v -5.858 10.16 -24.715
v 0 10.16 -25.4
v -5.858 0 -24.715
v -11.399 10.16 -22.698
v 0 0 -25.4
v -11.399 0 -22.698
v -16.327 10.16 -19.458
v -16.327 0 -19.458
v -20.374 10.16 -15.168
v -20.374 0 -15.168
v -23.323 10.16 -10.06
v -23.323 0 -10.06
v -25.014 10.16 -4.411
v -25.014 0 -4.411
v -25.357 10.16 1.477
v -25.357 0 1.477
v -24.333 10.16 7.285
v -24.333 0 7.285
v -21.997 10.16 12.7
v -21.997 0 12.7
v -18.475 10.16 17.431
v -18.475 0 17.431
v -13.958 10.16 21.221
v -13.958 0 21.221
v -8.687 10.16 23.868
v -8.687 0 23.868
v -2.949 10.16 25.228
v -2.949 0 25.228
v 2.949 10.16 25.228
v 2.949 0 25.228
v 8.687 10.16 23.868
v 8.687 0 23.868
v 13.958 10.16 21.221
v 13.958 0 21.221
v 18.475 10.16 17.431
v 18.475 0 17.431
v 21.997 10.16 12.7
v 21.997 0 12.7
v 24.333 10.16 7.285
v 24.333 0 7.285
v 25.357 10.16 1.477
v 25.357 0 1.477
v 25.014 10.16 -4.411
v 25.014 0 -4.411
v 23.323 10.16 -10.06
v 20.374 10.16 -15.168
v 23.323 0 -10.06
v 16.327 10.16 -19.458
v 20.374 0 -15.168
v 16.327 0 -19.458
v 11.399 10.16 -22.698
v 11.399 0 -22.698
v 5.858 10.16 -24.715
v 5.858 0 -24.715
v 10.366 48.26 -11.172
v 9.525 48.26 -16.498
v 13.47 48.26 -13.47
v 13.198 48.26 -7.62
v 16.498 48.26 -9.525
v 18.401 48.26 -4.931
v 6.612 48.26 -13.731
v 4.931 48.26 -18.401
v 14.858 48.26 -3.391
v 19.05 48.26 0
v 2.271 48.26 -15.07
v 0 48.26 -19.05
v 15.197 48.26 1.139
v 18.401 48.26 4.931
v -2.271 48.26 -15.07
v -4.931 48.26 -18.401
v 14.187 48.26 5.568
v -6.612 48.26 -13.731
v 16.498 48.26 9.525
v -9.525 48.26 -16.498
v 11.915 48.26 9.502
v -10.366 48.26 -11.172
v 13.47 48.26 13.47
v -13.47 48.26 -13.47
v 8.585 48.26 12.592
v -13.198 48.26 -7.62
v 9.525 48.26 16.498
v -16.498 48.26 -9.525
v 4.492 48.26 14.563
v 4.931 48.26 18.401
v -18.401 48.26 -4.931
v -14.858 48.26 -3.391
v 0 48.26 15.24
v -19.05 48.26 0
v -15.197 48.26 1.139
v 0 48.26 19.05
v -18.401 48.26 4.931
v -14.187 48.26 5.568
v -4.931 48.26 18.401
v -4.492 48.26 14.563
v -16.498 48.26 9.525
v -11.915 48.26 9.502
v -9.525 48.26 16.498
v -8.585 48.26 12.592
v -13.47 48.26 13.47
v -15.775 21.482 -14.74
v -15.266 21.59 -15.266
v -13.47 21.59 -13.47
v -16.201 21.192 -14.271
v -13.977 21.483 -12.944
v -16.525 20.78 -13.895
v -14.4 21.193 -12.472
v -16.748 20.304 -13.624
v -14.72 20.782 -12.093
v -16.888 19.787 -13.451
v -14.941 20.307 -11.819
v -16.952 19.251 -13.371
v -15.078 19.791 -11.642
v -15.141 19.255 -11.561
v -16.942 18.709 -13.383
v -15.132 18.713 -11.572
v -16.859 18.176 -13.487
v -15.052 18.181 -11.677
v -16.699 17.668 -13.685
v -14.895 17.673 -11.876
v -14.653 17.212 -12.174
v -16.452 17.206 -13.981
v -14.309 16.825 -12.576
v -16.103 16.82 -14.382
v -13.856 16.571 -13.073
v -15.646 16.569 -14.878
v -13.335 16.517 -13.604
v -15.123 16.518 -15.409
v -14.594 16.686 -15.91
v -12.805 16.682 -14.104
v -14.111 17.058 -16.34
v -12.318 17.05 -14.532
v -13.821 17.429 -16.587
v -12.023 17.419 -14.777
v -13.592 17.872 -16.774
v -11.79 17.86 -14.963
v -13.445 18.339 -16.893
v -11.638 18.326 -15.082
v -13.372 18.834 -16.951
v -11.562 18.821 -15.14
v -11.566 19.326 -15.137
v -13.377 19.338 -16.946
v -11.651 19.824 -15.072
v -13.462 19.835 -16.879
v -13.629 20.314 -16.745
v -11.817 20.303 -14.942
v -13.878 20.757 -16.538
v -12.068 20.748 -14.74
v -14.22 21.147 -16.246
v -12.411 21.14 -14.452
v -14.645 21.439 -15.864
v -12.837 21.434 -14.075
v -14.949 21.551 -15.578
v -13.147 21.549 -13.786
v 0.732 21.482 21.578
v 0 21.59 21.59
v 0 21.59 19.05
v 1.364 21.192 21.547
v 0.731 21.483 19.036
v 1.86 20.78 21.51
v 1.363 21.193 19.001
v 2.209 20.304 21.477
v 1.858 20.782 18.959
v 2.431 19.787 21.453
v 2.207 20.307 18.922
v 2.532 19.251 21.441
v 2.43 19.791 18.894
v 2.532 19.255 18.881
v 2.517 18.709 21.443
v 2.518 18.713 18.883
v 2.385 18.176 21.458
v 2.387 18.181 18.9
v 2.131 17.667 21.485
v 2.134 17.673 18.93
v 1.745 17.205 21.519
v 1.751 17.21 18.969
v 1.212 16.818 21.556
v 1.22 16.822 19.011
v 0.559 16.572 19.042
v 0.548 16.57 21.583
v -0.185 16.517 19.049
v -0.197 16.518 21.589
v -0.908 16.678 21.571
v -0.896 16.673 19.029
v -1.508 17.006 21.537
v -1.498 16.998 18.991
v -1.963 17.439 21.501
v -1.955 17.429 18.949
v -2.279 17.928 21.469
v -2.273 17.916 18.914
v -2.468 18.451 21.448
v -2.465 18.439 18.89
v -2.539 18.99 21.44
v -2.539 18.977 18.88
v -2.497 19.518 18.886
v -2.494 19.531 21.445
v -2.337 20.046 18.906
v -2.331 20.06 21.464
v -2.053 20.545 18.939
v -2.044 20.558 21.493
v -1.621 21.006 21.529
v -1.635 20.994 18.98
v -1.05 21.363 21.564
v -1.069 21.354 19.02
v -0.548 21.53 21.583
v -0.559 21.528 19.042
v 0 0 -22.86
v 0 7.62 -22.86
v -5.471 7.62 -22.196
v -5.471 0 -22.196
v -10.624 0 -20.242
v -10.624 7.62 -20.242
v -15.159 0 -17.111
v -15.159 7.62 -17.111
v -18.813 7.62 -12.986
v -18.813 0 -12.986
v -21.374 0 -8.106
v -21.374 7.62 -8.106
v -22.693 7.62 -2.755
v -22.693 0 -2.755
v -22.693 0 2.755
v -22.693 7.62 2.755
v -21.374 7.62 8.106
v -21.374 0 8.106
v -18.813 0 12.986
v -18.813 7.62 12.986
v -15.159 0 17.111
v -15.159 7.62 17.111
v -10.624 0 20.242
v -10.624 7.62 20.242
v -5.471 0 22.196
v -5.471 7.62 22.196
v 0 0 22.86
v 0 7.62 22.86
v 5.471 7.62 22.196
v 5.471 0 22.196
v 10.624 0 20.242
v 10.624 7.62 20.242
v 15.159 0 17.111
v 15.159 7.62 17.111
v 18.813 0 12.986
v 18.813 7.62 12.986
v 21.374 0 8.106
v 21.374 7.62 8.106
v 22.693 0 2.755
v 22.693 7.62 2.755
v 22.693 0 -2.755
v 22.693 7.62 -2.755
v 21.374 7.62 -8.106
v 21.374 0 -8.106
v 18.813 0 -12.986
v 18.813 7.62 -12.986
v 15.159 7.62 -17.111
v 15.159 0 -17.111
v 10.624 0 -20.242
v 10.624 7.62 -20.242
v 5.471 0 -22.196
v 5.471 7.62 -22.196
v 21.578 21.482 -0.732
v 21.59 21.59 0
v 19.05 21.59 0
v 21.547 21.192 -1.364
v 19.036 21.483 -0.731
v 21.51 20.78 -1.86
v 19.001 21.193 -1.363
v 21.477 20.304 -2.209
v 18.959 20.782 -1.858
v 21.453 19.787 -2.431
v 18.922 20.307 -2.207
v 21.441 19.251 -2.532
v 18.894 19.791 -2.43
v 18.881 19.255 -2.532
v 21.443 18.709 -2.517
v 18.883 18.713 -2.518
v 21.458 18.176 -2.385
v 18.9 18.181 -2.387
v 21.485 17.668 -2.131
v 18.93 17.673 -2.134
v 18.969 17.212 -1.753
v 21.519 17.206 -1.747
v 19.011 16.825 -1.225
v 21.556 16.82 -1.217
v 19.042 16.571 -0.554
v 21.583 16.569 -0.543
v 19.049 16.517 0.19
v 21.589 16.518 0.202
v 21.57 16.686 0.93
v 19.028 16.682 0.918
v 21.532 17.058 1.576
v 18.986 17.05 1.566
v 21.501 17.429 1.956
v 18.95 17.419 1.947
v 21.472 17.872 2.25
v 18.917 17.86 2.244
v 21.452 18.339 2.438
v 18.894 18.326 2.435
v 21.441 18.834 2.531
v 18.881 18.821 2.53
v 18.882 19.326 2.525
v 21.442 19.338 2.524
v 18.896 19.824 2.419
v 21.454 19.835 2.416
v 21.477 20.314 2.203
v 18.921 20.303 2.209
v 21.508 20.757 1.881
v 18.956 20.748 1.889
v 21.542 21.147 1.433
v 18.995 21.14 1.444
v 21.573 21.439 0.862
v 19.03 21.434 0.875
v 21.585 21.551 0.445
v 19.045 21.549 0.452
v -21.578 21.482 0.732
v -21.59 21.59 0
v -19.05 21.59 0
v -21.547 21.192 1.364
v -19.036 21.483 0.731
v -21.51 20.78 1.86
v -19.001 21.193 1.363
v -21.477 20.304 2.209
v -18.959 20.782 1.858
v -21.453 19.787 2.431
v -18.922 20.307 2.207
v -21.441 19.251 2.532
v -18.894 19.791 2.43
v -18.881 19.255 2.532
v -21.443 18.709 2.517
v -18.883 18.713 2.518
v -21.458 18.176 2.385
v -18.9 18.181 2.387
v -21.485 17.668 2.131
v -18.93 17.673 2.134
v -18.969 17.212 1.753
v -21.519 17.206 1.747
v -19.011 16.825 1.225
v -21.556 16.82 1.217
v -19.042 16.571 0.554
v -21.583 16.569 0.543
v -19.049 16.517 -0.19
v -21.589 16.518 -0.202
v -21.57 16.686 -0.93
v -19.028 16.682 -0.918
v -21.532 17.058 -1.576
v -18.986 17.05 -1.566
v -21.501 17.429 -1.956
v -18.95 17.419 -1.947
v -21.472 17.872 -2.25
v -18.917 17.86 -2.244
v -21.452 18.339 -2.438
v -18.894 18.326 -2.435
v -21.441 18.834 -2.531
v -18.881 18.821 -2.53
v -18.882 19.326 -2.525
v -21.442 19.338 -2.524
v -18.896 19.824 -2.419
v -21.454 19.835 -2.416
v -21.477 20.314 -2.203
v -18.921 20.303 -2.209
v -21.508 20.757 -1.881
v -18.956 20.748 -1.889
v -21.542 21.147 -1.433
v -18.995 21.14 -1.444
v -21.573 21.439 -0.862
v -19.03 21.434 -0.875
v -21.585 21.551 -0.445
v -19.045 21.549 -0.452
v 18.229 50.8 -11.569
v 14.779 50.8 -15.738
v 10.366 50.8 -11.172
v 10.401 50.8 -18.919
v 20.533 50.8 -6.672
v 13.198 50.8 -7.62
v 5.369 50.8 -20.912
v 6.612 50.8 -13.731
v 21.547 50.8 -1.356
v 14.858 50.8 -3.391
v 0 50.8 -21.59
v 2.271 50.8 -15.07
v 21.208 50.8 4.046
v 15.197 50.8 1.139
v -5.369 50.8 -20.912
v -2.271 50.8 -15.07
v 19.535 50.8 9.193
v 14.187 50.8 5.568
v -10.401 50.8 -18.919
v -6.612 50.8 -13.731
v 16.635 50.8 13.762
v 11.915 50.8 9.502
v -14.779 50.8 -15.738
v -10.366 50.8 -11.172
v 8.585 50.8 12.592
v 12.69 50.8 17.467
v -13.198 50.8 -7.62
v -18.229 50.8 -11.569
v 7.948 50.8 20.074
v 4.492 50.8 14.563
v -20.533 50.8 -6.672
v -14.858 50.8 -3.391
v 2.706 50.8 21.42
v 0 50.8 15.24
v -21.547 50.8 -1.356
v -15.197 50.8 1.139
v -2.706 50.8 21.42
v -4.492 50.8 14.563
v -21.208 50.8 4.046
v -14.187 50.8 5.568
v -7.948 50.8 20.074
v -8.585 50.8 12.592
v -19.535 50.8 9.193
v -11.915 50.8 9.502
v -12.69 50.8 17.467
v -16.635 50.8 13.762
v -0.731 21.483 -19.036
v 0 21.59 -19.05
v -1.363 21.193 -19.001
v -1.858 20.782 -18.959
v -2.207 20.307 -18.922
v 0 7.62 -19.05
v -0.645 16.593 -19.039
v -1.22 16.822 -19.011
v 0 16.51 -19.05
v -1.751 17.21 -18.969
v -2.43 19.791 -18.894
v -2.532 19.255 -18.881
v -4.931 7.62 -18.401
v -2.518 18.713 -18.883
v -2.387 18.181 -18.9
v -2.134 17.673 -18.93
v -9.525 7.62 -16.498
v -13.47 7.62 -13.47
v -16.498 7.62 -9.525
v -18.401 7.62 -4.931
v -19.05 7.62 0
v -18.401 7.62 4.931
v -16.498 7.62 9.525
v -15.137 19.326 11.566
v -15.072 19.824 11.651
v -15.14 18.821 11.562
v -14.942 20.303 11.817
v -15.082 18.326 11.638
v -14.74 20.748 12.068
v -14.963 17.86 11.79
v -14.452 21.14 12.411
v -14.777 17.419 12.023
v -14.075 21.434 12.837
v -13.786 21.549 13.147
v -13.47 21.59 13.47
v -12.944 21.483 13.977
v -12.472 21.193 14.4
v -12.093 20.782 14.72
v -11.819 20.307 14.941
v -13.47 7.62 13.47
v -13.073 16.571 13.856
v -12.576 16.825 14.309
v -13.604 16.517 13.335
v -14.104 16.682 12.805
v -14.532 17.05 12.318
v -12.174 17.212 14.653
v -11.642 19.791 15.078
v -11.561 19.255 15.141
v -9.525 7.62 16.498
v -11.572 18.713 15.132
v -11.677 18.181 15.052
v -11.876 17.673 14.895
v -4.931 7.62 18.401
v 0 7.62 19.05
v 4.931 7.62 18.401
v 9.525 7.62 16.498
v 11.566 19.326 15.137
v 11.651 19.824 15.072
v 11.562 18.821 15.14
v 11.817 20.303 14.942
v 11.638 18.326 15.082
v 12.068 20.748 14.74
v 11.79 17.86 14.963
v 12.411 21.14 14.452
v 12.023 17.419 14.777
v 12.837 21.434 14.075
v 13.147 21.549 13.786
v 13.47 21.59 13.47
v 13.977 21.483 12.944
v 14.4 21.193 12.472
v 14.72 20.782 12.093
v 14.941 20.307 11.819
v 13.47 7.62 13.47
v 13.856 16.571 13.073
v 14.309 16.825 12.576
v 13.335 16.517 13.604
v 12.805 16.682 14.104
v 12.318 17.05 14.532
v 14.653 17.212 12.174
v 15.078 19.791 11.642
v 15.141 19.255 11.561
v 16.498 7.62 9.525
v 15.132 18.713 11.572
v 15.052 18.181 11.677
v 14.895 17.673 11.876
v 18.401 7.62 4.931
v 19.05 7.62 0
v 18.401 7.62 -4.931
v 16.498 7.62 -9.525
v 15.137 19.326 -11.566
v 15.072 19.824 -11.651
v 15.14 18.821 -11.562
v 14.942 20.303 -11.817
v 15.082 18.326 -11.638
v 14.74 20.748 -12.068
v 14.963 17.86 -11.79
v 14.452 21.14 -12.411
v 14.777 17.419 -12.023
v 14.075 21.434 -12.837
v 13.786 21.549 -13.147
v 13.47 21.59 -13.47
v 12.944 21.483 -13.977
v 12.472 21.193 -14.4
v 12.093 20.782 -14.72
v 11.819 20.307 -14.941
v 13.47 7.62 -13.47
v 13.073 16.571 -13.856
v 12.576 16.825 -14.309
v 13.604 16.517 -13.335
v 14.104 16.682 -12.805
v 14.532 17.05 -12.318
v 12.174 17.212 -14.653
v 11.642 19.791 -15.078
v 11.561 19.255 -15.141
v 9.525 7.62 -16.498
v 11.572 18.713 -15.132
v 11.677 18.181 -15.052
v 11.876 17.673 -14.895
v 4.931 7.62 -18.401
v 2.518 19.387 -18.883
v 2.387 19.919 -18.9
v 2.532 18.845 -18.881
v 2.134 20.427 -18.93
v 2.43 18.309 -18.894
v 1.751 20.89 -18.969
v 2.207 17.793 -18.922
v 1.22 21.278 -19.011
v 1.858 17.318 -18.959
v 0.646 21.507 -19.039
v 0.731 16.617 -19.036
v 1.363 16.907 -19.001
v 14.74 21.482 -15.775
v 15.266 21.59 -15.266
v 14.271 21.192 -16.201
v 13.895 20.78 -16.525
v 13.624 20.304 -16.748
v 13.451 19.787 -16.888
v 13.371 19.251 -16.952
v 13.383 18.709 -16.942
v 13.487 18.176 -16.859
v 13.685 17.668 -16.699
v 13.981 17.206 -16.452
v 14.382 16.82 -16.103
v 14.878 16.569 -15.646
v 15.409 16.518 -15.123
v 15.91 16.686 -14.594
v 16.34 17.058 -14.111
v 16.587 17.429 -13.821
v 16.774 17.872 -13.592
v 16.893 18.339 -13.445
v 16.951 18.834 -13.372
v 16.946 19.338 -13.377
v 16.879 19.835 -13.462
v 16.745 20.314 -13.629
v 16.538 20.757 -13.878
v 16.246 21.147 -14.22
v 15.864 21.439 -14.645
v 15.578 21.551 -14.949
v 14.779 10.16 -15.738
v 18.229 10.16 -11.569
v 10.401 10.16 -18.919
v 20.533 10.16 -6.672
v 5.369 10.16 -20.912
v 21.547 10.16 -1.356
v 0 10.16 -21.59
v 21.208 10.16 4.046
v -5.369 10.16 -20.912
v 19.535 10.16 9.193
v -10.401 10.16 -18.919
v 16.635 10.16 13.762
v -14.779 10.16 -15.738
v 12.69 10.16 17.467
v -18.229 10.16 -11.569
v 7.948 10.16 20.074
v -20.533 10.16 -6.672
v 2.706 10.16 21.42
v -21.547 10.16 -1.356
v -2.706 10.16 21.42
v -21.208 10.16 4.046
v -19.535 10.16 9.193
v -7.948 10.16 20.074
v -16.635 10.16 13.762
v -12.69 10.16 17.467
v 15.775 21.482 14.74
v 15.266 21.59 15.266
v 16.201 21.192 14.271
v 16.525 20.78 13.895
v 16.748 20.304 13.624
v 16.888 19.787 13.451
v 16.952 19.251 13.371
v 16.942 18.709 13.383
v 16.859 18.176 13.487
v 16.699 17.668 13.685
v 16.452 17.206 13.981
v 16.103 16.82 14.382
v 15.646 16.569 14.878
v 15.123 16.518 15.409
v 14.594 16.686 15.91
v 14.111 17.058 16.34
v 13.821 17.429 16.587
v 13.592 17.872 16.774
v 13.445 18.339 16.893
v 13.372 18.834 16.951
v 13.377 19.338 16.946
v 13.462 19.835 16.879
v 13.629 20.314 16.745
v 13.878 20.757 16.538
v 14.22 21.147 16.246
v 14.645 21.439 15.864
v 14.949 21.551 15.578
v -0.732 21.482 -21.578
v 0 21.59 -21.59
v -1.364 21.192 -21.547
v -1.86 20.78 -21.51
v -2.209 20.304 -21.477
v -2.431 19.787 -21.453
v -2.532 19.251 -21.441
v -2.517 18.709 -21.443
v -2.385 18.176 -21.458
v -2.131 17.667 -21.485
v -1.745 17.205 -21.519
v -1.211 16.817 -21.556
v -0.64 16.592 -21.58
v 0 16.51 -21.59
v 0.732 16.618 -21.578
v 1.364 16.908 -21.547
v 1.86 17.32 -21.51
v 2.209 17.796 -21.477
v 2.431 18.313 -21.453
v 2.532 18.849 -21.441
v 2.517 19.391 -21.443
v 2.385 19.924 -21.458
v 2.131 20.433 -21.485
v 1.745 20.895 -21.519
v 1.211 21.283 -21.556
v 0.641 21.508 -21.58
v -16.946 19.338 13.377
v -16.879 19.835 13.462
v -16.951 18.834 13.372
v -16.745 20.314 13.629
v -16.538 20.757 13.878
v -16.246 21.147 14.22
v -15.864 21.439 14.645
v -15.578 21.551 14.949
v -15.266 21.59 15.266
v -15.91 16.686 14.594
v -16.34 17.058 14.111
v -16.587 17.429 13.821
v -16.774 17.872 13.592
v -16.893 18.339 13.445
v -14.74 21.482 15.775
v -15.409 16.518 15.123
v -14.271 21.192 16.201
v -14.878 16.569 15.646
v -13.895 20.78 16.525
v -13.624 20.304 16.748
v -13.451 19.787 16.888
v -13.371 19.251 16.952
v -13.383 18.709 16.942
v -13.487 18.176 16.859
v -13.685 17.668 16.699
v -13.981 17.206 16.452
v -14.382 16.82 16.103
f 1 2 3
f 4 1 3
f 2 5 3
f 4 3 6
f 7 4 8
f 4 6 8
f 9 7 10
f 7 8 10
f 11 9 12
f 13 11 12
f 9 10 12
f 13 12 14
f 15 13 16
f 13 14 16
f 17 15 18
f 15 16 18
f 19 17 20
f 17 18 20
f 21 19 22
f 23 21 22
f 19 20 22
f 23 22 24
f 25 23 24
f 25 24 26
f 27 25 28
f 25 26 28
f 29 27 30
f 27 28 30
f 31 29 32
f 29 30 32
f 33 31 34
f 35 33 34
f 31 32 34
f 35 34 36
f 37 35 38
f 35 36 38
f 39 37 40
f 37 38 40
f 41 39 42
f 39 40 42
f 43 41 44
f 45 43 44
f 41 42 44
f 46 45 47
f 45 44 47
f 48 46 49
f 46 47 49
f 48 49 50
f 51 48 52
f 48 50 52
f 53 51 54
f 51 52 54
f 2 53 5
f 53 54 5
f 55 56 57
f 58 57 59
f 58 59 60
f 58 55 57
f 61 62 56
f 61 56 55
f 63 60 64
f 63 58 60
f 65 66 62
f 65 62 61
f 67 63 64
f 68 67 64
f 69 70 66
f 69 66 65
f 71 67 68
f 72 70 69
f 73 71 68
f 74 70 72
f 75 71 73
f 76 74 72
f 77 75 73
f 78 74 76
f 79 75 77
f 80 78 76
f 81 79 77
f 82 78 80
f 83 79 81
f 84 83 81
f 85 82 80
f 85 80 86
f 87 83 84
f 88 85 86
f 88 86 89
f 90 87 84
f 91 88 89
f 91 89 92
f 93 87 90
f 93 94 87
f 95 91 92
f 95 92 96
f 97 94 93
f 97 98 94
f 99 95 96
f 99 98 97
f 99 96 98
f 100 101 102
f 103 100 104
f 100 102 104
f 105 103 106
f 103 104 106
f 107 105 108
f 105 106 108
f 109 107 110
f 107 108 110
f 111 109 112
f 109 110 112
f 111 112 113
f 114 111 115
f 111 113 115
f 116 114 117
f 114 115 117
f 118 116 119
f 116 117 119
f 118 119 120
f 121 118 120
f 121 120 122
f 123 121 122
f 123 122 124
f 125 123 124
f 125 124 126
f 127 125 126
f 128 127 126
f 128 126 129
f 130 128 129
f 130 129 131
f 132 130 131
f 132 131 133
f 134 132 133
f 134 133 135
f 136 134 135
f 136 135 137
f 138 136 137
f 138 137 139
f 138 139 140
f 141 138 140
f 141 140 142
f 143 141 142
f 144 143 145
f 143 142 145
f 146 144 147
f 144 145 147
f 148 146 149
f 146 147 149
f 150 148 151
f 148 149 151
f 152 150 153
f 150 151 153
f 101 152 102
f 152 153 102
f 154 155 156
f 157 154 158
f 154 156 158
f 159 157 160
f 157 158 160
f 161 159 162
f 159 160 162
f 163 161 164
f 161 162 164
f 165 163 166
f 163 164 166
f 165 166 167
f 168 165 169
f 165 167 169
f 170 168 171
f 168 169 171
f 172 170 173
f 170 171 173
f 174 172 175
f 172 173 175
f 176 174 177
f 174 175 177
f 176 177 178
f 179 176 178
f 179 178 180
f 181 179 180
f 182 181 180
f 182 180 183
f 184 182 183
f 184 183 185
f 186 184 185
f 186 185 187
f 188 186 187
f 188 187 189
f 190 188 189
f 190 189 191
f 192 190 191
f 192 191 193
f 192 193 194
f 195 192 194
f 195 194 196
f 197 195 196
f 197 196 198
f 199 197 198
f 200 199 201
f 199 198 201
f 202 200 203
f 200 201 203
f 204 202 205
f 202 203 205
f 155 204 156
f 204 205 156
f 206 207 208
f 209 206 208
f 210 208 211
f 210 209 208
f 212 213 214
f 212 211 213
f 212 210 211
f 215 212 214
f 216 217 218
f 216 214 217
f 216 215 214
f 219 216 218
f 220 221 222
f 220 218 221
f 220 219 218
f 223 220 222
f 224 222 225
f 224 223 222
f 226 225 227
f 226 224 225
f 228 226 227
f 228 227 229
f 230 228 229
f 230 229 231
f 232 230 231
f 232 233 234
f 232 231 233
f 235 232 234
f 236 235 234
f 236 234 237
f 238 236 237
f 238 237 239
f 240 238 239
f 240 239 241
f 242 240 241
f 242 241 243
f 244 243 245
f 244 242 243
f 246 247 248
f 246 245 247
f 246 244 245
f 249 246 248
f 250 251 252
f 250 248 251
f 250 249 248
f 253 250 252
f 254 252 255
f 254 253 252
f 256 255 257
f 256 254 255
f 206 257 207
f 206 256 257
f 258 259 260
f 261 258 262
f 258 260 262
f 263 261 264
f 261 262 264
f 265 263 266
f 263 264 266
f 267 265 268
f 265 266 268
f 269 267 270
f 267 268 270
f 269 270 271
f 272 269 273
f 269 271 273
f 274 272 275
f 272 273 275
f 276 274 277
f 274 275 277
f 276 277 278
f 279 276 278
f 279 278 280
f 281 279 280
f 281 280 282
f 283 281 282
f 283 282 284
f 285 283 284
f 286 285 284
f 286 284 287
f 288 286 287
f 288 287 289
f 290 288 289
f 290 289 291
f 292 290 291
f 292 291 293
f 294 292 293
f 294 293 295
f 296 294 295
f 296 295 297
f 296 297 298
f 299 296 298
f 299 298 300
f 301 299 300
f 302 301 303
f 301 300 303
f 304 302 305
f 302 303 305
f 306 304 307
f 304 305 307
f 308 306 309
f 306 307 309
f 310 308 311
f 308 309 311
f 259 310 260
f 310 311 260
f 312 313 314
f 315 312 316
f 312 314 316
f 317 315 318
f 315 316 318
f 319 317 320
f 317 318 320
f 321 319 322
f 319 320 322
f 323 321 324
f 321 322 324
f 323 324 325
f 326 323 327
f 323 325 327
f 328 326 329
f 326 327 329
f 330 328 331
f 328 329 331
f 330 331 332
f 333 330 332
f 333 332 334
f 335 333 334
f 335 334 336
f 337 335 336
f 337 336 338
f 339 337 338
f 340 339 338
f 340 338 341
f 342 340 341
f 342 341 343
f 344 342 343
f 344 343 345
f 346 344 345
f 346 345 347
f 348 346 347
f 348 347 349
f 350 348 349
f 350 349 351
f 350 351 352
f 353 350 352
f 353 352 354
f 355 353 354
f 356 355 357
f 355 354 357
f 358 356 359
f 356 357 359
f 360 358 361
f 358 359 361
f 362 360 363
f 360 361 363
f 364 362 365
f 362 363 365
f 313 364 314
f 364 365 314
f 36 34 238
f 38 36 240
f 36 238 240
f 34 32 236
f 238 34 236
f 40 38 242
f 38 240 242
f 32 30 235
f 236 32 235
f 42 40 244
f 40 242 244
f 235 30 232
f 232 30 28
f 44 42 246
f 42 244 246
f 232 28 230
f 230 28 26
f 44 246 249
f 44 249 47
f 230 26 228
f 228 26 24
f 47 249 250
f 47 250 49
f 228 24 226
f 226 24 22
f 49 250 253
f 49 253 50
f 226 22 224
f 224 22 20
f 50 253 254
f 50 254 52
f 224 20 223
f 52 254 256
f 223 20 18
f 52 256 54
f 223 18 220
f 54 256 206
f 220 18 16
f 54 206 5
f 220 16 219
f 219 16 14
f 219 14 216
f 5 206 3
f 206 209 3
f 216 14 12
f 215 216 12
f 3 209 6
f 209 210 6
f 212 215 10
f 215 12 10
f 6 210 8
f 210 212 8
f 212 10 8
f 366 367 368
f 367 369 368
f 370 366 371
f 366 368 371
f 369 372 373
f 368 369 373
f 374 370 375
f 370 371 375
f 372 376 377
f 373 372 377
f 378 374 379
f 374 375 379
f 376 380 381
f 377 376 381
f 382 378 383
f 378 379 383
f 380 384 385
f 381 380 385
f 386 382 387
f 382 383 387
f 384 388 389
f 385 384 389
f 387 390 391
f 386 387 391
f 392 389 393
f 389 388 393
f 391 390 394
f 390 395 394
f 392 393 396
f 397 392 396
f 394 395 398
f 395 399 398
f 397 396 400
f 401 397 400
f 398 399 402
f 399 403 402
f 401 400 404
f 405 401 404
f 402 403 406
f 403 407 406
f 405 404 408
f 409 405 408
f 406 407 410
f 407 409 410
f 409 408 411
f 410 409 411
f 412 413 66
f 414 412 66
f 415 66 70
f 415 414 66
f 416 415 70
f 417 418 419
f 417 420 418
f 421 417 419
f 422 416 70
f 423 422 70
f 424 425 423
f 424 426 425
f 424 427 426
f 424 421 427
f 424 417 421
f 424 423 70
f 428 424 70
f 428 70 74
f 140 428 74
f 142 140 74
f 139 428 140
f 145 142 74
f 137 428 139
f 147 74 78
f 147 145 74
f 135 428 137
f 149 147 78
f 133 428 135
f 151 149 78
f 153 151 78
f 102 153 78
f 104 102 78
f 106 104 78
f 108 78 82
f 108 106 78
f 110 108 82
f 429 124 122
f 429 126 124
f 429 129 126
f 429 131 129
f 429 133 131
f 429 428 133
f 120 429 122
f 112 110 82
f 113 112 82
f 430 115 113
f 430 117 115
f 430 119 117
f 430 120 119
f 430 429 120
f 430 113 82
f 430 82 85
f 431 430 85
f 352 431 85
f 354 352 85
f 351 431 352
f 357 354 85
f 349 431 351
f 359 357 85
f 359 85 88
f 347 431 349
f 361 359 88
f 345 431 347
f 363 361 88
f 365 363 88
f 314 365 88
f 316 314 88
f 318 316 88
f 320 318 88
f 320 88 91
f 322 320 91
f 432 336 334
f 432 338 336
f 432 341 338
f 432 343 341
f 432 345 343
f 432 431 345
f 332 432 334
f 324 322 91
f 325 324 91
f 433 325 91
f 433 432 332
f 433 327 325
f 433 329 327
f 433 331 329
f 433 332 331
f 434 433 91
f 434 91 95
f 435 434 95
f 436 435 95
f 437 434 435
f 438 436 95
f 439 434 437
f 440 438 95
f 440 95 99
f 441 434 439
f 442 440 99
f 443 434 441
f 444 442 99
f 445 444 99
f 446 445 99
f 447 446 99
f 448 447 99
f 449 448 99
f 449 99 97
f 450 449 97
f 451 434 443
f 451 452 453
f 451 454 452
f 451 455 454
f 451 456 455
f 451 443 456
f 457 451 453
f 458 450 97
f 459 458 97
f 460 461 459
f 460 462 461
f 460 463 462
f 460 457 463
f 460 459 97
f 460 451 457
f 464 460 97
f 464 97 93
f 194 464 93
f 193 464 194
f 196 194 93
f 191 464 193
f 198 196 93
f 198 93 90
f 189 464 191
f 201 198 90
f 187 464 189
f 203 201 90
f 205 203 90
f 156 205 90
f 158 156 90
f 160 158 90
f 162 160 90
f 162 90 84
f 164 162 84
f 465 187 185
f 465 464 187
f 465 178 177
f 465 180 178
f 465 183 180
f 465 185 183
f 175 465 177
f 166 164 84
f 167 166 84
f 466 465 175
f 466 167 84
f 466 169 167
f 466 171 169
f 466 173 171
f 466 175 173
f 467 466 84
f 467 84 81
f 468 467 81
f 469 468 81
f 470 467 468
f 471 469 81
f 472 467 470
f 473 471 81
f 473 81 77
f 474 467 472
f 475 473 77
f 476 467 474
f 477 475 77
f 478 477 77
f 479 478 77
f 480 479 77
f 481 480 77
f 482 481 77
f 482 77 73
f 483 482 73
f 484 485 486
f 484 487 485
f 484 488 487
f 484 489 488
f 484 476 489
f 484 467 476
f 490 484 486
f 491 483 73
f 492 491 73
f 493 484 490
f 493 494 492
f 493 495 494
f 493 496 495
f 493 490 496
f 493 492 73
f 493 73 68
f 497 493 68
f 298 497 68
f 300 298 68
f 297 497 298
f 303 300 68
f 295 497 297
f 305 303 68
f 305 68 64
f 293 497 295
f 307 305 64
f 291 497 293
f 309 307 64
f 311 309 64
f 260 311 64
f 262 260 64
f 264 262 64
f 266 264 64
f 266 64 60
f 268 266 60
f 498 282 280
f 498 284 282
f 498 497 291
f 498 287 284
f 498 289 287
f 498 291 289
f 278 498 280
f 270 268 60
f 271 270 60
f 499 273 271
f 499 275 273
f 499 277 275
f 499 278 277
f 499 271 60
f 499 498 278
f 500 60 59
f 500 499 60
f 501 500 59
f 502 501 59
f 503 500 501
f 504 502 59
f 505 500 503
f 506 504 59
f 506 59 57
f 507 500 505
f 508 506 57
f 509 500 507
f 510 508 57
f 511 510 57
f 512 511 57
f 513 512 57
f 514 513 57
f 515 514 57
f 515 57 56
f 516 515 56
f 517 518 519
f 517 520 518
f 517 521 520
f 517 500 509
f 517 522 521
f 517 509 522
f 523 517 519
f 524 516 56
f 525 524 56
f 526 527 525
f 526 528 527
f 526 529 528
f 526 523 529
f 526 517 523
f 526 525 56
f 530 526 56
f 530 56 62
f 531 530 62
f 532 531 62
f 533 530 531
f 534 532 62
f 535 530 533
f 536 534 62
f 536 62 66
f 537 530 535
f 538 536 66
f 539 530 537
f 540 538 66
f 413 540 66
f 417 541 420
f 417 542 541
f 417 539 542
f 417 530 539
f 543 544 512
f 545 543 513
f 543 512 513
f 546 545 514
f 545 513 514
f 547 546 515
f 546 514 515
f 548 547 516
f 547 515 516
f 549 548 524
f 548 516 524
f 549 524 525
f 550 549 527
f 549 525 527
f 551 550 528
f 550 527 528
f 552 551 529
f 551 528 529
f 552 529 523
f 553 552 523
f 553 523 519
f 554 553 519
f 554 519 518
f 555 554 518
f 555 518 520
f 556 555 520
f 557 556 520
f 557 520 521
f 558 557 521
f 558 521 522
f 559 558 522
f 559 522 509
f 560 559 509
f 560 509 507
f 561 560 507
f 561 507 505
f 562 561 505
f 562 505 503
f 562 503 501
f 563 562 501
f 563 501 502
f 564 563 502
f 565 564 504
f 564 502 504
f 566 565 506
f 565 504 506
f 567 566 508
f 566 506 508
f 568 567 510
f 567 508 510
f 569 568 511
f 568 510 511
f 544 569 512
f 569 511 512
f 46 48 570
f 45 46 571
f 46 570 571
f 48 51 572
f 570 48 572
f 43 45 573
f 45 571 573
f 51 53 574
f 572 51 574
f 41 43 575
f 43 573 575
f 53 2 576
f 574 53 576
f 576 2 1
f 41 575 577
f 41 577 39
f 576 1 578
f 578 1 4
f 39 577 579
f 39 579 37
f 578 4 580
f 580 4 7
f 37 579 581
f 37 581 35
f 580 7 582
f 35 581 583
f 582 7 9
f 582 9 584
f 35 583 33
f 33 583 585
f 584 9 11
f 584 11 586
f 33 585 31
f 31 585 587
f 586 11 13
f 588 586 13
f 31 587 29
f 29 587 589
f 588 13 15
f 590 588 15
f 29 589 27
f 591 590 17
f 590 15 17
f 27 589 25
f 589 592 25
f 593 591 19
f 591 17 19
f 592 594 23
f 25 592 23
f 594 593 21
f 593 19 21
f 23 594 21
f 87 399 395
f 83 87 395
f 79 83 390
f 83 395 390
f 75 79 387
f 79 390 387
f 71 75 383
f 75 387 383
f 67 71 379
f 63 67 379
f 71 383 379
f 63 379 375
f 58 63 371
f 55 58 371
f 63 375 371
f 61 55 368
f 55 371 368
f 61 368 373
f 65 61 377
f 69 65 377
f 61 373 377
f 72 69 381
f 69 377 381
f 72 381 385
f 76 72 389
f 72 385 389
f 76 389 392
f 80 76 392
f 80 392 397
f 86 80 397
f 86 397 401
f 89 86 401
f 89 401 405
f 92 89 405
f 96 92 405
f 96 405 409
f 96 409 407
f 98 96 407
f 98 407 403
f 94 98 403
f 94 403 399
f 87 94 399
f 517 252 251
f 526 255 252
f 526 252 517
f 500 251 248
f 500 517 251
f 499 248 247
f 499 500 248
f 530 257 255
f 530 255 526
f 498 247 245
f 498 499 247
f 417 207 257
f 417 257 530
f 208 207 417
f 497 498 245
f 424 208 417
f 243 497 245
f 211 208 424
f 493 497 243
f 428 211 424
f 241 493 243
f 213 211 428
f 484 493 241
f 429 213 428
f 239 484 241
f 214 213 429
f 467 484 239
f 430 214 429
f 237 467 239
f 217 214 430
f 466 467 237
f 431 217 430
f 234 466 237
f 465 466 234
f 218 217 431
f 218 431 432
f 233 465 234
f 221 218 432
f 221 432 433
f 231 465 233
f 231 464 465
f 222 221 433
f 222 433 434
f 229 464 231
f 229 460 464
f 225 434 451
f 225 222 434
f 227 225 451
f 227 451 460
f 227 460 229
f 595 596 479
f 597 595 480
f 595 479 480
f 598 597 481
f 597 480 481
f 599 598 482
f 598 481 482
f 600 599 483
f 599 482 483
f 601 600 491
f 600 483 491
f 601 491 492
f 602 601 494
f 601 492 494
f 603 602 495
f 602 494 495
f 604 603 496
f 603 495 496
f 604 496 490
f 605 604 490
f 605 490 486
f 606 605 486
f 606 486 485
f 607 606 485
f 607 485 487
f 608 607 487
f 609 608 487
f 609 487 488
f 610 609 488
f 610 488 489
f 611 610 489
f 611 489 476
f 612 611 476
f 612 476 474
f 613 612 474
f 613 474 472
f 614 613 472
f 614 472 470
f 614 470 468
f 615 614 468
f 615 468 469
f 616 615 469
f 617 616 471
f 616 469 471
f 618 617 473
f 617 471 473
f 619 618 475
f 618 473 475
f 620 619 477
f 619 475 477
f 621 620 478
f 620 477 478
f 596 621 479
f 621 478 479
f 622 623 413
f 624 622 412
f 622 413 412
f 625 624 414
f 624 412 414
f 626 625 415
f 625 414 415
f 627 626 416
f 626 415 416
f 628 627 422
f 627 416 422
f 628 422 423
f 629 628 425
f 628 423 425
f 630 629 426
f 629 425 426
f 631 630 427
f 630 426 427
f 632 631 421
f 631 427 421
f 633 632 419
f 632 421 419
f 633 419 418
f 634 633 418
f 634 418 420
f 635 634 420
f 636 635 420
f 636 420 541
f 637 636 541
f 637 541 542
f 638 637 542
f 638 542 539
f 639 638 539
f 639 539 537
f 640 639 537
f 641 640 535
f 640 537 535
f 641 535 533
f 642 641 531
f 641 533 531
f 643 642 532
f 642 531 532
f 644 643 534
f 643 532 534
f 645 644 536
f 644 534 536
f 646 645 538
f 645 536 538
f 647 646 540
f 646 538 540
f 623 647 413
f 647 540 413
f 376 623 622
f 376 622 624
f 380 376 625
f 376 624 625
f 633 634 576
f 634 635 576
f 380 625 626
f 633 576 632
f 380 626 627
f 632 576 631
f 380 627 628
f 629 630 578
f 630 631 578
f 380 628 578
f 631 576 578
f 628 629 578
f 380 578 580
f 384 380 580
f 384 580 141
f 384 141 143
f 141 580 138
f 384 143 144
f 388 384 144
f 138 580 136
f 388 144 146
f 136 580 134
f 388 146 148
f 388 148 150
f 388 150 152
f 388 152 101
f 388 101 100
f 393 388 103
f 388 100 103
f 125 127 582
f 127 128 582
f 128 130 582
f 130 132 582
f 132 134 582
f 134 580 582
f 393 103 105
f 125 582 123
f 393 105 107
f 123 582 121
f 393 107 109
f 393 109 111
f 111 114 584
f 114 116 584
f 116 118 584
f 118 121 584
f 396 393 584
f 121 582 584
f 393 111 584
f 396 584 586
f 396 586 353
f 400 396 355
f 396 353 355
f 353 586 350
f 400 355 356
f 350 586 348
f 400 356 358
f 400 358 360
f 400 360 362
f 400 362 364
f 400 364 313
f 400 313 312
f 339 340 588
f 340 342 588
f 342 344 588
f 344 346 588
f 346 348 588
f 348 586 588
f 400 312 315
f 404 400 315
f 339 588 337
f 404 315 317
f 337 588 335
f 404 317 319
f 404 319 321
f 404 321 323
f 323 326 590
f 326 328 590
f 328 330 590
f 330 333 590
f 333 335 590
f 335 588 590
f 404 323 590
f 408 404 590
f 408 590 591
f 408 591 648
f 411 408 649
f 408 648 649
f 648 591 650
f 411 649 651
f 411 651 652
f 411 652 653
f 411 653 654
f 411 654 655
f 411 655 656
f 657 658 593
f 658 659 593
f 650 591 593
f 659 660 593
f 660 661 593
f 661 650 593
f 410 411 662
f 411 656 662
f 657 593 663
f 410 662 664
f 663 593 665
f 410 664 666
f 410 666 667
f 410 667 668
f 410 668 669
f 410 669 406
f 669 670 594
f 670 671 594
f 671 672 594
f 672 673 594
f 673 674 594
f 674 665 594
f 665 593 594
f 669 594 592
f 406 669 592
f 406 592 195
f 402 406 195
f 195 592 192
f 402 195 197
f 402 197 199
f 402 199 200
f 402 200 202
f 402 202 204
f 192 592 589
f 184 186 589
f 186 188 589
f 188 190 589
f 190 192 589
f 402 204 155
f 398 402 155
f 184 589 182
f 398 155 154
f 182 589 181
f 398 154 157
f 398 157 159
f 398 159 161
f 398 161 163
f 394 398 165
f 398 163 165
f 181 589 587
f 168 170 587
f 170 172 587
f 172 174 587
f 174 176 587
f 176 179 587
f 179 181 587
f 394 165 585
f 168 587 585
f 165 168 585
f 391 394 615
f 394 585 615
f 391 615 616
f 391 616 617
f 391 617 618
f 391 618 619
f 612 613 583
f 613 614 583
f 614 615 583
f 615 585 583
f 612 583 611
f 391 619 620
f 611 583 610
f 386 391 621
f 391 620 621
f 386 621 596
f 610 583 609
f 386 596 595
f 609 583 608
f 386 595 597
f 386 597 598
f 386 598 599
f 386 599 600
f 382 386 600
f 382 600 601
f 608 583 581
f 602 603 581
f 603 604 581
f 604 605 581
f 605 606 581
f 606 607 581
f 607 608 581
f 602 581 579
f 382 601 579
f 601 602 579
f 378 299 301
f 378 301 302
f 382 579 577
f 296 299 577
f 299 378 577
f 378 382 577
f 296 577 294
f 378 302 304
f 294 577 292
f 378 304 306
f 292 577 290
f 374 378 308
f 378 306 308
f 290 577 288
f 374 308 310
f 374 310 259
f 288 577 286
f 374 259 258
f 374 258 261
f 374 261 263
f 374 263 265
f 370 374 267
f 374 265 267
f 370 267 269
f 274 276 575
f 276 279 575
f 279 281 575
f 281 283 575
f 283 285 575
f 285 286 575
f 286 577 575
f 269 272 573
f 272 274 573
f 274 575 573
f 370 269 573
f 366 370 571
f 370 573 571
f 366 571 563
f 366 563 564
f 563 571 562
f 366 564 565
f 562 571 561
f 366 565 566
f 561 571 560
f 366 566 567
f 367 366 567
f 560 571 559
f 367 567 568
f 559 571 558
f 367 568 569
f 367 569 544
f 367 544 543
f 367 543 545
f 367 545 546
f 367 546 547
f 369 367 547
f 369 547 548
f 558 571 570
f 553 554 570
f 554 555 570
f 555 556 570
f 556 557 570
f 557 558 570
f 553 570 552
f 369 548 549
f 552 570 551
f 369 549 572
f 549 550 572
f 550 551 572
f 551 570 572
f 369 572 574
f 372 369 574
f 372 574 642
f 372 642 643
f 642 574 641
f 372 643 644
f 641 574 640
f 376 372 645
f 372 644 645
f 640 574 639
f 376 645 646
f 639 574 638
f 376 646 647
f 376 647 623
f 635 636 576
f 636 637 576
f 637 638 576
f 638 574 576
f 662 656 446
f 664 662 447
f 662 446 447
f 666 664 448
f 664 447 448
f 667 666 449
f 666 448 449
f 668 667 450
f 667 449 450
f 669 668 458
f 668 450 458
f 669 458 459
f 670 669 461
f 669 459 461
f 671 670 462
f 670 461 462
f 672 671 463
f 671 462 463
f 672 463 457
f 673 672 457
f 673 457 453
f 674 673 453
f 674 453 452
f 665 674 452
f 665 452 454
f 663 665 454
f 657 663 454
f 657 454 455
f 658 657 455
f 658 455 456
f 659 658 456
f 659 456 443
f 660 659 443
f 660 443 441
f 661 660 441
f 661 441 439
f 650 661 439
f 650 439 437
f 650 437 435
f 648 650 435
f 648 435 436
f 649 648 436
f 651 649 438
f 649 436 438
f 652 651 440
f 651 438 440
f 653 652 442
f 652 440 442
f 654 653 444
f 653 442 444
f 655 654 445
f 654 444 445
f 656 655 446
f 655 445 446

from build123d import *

# Parameters (mm, degrees)
SHELL3_T           = -2.54
SKETCH2_R          = 15.24
CUT_EXTRUDE2_DEPTH = 63.217039467
SKETCH3_R          = 2.54
CUT_EXTRUDE3_DEPTH = 63.217039467
CIRPATTERN1_COUNT  = 8


with BuildPart() as part:
    # Sketch1 → Revolve1 (revolve)
    with BuildSketch(Plane.XY, mode=Mode.PRIVATE) as revolve1_sk:
        Polygon((0, 0), (0, 50.8), (21.59, 50.8), (21.59, 10.16), (25.4, 10.16), (25.4, 0), align=None)
    revolve(revolve1_sk.sketch.rotate(Axis((0, 0, 0), (0, 1, 0)), 90), axis=Axis((0, 0, 0), (0, 1, 0)))

    # Shell3
    shell3_openings = [part.faces().sort_by_distance(p)[0] for p in [
        (0, 0, 0),
    ]]
    offset(amount=SHELL3_T, openings=shell3_openings, kind=Kind.INTERSECTION)

    # Sketch2 → Cut-Extrude2 (cut, through all)
    with BuildSketch(Plane(origin=(0, 50.8, 0), x_dir=(1, 0, 0), z_dir=(0, 1, 0))):
        with Locations(Location((0, 0, 0), (0, 0, 270))):
            Circle(SKETCH2_R)
    extrude(amount=-CUT_EXTRUDE2_DEPTH, mode=Mode.SUBTRACT)

    # Sketch3 → Cut-Extrude3 (cut, through all)
    with BuildSketch(Plane.XY):
        with Locations(Location((0, 19.05, 0), (0, 0, 90))):
            Circle(SKETCH3_R)
    cut_extrude3 = extrude(amount=-CUT_EXTRUDE3_DEPTH, mode=Mode.SUBTRACT)

    # CirPattern1: Cut-Extrude3 ×8 about axis
    cirpattern1_axis = Axis((0, 50.8, 0), (0, -1, 0))
    for i in range(1, CIRPATTERN1_COUNT):
        add(cut_extrude3.rotate(cirpattern1_axis, i * 360 / CIRPATTERN1_COUNT), mode=Mode.SUBTRACT)


solid = part.part
